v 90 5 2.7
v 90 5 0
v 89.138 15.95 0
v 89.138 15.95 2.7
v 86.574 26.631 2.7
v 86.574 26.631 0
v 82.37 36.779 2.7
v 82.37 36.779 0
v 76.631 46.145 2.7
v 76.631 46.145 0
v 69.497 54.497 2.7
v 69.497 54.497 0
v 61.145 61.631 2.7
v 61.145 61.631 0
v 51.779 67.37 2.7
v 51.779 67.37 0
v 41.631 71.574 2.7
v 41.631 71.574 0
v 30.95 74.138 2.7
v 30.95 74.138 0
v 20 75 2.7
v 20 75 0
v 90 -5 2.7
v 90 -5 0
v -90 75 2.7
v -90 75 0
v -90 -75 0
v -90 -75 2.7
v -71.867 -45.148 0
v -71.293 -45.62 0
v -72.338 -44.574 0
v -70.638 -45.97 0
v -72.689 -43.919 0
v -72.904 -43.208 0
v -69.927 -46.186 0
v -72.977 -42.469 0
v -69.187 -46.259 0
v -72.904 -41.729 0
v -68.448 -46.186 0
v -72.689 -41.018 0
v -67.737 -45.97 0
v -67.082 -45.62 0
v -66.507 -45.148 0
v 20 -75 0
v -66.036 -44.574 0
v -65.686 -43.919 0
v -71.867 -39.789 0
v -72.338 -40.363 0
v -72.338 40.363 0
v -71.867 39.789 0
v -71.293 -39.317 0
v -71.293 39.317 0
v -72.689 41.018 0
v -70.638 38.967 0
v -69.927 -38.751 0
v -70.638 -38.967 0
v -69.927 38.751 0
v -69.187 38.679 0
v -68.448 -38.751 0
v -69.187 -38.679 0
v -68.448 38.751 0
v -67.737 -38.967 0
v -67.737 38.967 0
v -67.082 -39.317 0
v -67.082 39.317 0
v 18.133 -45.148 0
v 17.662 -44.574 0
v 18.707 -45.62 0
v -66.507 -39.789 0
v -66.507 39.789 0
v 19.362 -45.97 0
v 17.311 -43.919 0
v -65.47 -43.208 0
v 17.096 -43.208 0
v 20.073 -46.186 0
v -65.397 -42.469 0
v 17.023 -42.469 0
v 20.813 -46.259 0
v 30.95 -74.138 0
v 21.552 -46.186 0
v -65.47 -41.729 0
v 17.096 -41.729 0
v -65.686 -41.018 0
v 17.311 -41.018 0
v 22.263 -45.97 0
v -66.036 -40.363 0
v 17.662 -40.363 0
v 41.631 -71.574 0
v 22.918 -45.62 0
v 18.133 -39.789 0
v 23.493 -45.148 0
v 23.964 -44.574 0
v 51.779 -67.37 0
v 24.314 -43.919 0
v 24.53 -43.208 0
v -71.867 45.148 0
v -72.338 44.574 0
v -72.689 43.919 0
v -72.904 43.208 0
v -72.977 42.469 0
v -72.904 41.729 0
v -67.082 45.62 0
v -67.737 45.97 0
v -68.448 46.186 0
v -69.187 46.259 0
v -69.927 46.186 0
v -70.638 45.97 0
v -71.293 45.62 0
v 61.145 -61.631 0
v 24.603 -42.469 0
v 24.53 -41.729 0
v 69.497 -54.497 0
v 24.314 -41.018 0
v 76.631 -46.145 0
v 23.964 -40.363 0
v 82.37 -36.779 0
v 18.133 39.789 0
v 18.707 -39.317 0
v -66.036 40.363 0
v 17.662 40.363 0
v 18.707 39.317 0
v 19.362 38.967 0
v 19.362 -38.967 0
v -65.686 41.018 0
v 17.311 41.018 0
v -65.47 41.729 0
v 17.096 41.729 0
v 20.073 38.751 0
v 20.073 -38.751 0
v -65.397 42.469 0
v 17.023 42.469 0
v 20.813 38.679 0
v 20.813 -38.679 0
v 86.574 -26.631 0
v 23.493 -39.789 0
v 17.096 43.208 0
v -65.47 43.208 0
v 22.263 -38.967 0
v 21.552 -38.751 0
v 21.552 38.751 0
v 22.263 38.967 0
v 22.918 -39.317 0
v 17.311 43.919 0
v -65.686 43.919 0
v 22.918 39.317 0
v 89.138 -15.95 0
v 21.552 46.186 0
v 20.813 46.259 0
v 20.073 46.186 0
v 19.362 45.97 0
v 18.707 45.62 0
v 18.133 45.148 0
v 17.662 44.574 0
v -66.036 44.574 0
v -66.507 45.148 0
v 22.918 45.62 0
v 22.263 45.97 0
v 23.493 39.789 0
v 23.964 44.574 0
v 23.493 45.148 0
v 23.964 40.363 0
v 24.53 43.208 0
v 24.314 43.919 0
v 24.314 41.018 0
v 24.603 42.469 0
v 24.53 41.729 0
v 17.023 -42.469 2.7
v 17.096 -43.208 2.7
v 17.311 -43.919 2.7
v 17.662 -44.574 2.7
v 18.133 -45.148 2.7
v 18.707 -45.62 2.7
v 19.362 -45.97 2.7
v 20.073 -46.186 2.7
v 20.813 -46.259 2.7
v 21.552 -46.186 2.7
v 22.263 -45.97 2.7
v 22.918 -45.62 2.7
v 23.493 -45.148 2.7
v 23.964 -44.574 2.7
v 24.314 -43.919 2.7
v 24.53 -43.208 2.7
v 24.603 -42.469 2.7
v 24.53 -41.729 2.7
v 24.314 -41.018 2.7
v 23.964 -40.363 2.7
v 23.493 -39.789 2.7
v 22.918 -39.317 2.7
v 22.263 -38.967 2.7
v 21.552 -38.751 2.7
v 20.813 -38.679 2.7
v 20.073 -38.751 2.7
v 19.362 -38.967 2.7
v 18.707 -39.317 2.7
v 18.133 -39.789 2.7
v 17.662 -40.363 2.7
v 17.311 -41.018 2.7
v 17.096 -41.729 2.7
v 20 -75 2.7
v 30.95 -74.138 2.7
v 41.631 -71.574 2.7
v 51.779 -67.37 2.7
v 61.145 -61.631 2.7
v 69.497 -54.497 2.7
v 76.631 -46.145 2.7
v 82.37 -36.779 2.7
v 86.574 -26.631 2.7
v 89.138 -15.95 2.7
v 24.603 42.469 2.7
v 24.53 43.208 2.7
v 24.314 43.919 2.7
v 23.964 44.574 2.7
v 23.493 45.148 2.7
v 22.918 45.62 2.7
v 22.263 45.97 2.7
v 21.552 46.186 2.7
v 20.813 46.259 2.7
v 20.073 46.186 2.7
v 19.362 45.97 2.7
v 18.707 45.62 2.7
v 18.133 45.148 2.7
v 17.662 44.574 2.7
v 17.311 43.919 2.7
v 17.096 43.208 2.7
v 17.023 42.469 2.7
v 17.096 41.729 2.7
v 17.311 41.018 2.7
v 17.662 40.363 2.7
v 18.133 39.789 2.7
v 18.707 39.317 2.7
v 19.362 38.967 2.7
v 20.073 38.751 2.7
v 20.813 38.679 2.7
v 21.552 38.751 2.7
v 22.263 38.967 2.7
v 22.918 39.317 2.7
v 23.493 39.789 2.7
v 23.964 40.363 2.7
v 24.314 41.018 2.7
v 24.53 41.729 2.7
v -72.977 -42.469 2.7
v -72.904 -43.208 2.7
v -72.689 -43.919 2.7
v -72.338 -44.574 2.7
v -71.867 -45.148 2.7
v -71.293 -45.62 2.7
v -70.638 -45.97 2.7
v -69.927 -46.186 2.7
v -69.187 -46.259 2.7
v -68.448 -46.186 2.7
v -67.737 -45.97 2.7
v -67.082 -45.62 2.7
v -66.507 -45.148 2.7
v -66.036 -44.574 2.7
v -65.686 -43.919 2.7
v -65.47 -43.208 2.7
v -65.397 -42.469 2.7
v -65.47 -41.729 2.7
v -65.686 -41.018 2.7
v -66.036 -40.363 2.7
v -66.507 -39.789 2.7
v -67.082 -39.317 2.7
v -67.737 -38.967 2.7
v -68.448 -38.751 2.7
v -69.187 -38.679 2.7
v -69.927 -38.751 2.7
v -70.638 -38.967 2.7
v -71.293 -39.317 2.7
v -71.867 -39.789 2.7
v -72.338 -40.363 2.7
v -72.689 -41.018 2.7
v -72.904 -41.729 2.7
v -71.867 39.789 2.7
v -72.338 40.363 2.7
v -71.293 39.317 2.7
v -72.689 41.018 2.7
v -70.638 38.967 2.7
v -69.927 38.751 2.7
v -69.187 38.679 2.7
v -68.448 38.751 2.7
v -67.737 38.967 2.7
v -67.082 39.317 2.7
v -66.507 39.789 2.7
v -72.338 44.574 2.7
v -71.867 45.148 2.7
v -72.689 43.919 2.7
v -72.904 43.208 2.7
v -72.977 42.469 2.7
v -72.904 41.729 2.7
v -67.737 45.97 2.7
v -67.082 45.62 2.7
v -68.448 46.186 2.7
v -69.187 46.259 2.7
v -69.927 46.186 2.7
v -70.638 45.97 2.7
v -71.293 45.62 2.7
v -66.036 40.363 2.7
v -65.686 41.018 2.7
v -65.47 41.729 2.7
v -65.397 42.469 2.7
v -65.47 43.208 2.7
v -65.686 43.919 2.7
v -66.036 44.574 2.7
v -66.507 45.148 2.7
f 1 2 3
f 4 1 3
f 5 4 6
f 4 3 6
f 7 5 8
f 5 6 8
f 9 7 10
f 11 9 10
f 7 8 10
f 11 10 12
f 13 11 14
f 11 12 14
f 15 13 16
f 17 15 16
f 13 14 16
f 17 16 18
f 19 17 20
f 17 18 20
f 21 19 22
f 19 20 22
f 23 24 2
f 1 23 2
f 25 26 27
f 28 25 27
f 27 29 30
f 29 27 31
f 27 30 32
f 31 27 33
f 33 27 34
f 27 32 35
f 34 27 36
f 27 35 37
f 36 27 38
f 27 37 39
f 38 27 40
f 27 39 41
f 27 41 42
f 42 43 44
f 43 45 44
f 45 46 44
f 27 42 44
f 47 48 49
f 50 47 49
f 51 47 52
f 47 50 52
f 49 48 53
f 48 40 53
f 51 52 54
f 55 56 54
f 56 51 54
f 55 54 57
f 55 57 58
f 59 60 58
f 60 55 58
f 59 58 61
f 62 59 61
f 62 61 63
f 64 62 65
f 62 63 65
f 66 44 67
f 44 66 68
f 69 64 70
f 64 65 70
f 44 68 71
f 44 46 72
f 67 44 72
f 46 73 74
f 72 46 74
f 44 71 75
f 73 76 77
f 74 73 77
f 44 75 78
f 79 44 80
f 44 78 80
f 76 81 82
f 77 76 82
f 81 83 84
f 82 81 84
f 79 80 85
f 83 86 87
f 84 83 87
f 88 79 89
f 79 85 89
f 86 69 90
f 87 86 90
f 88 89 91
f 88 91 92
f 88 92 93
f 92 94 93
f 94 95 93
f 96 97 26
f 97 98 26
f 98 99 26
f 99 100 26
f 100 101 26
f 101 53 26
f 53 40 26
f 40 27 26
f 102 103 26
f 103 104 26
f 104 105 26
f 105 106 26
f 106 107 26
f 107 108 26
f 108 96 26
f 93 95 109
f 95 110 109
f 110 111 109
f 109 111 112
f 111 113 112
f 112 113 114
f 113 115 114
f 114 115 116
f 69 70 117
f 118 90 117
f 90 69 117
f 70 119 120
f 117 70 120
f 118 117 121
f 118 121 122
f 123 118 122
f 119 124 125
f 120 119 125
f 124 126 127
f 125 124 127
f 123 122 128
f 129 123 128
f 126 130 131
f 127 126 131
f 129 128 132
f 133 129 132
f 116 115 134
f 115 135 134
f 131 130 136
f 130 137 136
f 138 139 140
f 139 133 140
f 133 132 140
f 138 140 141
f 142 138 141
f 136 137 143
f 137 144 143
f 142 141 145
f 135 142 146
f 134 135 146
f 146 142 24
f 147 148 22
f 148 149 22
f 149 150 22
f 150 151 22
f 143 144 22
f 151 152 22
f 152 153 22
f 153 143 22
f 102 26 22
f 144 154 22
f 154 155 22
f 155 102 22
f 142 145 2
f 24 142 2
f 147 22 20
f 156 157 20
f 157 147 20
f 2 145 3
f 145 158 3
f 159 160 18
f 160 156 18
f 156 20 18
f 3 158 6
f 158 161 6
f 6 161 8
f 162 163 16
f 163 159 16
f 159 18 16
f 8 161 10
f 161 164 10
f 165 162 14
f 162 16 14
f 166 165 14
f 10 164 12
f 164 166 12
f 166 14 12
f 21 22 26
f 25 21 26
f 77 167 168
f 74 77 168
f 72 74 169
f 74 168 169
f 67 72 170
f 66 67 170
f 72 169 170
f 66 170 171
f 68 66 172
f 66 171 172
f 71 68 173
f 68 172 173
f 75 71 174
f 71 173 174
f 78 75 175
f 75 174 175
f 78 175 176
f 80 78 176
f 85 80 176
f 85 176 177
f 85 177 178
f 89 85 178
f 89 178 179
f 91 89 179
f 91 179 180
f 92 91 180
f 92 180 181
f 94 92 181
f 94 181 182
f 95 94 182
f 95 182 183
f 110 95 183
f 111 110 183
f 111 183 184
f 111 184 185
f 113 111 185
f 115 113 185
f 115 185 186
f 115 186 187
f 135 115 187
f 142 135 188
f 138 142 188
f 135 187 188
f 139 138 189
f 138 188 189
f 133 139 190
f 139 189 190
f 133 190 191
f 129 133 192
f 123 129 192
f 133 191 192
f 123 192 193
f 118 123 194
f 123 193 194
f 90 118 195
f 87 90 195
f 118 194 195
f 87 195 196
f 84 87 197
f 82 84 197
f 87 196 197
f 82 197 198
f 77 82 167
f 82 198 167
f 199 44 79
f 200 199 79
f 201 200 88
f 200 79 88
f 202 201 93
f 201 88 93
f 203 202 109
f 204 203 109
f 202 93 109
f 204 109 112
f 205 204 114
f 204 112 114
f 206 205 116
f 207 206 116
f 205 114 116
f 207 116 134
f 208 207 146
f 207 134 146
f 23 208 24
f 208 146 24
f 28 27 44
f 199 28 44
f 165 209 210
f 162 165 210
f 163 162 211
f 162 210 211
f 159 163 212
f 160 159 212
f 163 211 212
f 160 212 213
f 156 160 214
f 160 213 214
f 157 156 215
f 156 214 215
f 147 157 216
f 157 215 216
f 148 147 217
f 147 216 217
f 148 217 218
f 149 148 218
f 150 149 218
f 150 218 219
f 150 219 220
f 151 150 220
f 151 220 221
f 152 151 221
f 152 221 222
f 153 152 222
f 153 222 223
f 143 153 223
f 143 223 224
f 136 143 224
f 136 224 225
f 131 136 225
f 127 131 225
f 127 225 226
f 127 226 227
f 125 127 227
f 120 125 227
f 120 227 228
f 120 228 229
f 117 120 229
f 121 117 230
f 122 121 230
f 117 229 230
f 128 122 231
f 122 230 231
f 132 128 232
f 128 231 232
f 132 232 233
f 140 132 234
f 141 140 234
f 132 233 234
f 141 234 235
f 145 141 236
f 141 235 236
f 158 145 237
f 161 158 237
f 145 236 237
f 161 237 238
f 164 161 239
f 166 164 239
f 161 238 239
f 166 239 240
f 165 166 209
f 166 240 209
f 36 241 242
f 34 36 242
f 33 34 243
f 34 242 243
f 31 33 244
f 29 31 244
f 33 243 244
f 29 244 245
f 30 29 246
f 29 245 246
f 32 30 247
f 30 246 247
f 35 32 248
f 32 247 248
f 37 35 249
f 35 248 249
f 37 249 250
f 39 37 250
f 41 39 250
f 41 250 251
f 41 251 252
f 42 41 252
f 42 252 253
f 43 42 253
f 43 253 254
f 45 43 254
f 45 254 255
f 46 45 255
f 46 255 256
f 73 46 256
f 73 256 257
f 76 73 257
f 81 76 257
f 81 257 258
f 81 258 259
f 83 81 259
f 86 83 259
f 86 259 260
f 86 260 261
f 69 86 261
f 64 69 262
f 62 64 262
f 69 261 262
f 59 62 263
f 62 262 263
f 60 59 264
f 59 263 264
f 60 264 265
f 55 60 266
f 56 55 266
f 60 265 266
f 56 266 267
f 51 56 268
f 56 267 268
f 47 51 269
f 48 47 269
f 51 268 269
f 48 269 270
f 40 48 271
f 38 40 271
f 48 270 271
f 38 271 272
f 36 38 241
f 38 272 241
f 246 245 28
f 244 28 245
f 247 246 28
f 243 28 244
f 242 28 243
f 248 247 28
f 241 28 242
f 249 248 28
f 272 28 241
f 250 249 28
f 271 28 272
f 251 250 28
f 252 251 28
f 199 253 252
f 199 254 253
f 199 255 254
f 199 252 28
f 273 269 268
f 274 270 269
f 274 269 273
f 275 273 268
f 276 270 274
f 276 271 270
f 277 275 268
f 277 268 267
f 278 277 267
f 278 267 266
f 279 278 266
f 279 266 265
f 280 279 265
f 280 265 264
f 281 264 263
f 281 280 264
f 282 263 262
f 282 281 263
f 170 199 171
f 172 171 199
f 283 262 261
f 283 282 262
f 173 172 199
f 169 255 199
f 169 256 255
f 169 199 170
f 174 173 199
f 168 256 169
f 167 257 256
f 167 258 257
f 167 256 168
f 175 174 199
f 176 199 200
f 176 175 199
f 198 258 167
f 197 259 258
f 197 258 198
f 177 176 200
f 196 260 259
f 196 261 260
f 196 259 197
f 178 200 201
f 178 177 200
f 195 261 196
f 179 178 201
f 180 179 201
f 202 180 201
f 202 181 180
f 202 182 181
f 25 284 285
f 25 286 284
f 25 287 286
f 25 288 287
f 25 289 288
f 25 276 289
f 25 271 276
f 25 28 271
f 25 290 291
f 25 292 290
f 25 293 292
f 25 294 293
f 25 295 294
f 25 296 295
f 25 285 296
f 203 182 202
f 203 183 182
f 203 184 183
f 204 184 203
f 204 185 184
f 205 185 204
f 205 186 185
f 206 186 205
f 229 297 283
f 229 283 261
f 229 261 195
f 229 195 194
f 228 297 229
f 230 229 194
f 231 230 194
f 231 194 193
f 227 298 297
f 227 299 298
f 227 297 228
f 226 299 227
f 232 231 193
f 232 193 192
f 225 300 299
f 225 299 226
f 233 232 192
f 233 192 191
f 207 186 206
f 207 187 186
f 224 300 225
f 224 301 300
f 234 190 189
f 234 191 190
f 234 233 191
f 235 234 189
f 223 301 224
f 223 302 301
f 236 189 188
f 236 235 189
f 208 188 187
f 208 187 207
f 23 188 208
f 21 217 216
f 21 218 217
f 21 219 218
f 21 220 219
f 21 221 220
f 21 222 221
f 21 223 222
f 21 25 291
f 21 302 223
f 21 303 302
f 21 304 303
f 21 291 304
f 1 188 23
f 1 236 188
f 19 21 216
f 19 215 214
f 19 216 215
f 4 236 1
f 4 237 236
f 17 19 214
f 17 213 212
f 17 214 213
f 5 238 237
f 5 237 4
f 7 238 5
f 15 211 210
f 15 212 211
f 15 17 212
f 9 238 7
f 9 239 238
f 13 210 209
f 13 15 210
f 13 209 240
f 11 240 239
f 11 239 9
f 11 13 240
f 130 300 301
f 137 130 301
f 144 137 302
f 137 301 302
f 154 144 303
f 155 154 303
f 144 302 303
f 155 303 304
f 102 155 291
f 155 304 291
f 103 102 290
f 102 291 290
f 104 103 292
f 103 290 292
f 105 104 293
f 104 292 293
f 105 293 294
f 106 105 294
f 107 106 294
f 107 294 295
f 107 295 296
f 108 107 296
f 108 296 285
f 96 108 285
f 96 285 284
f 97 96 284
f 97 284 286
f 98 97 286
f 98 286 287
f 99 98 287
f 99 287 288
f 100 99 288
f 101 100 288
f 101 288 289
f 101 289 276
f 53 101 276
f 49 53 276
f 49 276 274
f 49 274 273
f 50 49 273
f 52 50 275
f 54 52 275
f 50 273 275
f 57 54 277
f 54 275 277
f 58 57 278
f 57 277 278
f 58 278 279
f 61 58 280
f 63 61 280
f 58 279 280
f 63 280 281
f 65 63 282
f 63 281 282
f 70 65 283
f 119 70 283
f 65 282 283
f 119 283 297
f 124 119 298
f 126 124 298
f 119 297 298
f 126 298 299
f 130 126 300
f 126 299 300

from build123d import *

# Parameters (mm, degrees)
Y_KSEKLIK_EKSTR_ZYON3_DEPTH = 2.7
IZIM2_R                     = 3.79
KES_EKSTR_ZYON1_DEPTH       = 2.75


with BuildPart() as part:
    # Çizim1 → Yükseklik-Ekstrüzyon3 (new body)
    with BuildSketch(Plane.XY):
        with BuildLine():
            Line((-90, -75), (20, -75))
            ThreePointArc((20, -75), (69.497474683, -54.497474683), (90, -5))
            Line((90, -5), (90, 5))
            ThreePointArc((90, 5), (69.497474683, 54.497474683), (20, 75))
            Line((20, 75), (-90, 75))
            Line((-90, 75), (-90, -75))
        make_face()
    extrude(amount=Y_KSEKLIK_EKSTR_ZYON3_DEPTH)

    # Çizim2 → Kes-Ekstrüzyon1 (cut)
    with BuildSketch(Plane.XY.offset(2.7)):
        with Locations((-69.187191481, 42.468560625)):
            Circle(IZIM2_R)
        with Locations((20.812808519, 42.468560625)):
            Circle(IZIM2_R)
        with Locations(Location((20.812808519, -42.468560625, 0), (0, 0, 180))):
            Circle(IZIM2_R)
        with Locations(Location((-69.187191481, -42.468560625, 0), (0, 0, 180))):
            Circle(IZIM2_R)
    extrude(amount=-KES_EKSTR_ZYON1_DEPTH, mode=Mode.SUBTRACT)


solid = part.part
